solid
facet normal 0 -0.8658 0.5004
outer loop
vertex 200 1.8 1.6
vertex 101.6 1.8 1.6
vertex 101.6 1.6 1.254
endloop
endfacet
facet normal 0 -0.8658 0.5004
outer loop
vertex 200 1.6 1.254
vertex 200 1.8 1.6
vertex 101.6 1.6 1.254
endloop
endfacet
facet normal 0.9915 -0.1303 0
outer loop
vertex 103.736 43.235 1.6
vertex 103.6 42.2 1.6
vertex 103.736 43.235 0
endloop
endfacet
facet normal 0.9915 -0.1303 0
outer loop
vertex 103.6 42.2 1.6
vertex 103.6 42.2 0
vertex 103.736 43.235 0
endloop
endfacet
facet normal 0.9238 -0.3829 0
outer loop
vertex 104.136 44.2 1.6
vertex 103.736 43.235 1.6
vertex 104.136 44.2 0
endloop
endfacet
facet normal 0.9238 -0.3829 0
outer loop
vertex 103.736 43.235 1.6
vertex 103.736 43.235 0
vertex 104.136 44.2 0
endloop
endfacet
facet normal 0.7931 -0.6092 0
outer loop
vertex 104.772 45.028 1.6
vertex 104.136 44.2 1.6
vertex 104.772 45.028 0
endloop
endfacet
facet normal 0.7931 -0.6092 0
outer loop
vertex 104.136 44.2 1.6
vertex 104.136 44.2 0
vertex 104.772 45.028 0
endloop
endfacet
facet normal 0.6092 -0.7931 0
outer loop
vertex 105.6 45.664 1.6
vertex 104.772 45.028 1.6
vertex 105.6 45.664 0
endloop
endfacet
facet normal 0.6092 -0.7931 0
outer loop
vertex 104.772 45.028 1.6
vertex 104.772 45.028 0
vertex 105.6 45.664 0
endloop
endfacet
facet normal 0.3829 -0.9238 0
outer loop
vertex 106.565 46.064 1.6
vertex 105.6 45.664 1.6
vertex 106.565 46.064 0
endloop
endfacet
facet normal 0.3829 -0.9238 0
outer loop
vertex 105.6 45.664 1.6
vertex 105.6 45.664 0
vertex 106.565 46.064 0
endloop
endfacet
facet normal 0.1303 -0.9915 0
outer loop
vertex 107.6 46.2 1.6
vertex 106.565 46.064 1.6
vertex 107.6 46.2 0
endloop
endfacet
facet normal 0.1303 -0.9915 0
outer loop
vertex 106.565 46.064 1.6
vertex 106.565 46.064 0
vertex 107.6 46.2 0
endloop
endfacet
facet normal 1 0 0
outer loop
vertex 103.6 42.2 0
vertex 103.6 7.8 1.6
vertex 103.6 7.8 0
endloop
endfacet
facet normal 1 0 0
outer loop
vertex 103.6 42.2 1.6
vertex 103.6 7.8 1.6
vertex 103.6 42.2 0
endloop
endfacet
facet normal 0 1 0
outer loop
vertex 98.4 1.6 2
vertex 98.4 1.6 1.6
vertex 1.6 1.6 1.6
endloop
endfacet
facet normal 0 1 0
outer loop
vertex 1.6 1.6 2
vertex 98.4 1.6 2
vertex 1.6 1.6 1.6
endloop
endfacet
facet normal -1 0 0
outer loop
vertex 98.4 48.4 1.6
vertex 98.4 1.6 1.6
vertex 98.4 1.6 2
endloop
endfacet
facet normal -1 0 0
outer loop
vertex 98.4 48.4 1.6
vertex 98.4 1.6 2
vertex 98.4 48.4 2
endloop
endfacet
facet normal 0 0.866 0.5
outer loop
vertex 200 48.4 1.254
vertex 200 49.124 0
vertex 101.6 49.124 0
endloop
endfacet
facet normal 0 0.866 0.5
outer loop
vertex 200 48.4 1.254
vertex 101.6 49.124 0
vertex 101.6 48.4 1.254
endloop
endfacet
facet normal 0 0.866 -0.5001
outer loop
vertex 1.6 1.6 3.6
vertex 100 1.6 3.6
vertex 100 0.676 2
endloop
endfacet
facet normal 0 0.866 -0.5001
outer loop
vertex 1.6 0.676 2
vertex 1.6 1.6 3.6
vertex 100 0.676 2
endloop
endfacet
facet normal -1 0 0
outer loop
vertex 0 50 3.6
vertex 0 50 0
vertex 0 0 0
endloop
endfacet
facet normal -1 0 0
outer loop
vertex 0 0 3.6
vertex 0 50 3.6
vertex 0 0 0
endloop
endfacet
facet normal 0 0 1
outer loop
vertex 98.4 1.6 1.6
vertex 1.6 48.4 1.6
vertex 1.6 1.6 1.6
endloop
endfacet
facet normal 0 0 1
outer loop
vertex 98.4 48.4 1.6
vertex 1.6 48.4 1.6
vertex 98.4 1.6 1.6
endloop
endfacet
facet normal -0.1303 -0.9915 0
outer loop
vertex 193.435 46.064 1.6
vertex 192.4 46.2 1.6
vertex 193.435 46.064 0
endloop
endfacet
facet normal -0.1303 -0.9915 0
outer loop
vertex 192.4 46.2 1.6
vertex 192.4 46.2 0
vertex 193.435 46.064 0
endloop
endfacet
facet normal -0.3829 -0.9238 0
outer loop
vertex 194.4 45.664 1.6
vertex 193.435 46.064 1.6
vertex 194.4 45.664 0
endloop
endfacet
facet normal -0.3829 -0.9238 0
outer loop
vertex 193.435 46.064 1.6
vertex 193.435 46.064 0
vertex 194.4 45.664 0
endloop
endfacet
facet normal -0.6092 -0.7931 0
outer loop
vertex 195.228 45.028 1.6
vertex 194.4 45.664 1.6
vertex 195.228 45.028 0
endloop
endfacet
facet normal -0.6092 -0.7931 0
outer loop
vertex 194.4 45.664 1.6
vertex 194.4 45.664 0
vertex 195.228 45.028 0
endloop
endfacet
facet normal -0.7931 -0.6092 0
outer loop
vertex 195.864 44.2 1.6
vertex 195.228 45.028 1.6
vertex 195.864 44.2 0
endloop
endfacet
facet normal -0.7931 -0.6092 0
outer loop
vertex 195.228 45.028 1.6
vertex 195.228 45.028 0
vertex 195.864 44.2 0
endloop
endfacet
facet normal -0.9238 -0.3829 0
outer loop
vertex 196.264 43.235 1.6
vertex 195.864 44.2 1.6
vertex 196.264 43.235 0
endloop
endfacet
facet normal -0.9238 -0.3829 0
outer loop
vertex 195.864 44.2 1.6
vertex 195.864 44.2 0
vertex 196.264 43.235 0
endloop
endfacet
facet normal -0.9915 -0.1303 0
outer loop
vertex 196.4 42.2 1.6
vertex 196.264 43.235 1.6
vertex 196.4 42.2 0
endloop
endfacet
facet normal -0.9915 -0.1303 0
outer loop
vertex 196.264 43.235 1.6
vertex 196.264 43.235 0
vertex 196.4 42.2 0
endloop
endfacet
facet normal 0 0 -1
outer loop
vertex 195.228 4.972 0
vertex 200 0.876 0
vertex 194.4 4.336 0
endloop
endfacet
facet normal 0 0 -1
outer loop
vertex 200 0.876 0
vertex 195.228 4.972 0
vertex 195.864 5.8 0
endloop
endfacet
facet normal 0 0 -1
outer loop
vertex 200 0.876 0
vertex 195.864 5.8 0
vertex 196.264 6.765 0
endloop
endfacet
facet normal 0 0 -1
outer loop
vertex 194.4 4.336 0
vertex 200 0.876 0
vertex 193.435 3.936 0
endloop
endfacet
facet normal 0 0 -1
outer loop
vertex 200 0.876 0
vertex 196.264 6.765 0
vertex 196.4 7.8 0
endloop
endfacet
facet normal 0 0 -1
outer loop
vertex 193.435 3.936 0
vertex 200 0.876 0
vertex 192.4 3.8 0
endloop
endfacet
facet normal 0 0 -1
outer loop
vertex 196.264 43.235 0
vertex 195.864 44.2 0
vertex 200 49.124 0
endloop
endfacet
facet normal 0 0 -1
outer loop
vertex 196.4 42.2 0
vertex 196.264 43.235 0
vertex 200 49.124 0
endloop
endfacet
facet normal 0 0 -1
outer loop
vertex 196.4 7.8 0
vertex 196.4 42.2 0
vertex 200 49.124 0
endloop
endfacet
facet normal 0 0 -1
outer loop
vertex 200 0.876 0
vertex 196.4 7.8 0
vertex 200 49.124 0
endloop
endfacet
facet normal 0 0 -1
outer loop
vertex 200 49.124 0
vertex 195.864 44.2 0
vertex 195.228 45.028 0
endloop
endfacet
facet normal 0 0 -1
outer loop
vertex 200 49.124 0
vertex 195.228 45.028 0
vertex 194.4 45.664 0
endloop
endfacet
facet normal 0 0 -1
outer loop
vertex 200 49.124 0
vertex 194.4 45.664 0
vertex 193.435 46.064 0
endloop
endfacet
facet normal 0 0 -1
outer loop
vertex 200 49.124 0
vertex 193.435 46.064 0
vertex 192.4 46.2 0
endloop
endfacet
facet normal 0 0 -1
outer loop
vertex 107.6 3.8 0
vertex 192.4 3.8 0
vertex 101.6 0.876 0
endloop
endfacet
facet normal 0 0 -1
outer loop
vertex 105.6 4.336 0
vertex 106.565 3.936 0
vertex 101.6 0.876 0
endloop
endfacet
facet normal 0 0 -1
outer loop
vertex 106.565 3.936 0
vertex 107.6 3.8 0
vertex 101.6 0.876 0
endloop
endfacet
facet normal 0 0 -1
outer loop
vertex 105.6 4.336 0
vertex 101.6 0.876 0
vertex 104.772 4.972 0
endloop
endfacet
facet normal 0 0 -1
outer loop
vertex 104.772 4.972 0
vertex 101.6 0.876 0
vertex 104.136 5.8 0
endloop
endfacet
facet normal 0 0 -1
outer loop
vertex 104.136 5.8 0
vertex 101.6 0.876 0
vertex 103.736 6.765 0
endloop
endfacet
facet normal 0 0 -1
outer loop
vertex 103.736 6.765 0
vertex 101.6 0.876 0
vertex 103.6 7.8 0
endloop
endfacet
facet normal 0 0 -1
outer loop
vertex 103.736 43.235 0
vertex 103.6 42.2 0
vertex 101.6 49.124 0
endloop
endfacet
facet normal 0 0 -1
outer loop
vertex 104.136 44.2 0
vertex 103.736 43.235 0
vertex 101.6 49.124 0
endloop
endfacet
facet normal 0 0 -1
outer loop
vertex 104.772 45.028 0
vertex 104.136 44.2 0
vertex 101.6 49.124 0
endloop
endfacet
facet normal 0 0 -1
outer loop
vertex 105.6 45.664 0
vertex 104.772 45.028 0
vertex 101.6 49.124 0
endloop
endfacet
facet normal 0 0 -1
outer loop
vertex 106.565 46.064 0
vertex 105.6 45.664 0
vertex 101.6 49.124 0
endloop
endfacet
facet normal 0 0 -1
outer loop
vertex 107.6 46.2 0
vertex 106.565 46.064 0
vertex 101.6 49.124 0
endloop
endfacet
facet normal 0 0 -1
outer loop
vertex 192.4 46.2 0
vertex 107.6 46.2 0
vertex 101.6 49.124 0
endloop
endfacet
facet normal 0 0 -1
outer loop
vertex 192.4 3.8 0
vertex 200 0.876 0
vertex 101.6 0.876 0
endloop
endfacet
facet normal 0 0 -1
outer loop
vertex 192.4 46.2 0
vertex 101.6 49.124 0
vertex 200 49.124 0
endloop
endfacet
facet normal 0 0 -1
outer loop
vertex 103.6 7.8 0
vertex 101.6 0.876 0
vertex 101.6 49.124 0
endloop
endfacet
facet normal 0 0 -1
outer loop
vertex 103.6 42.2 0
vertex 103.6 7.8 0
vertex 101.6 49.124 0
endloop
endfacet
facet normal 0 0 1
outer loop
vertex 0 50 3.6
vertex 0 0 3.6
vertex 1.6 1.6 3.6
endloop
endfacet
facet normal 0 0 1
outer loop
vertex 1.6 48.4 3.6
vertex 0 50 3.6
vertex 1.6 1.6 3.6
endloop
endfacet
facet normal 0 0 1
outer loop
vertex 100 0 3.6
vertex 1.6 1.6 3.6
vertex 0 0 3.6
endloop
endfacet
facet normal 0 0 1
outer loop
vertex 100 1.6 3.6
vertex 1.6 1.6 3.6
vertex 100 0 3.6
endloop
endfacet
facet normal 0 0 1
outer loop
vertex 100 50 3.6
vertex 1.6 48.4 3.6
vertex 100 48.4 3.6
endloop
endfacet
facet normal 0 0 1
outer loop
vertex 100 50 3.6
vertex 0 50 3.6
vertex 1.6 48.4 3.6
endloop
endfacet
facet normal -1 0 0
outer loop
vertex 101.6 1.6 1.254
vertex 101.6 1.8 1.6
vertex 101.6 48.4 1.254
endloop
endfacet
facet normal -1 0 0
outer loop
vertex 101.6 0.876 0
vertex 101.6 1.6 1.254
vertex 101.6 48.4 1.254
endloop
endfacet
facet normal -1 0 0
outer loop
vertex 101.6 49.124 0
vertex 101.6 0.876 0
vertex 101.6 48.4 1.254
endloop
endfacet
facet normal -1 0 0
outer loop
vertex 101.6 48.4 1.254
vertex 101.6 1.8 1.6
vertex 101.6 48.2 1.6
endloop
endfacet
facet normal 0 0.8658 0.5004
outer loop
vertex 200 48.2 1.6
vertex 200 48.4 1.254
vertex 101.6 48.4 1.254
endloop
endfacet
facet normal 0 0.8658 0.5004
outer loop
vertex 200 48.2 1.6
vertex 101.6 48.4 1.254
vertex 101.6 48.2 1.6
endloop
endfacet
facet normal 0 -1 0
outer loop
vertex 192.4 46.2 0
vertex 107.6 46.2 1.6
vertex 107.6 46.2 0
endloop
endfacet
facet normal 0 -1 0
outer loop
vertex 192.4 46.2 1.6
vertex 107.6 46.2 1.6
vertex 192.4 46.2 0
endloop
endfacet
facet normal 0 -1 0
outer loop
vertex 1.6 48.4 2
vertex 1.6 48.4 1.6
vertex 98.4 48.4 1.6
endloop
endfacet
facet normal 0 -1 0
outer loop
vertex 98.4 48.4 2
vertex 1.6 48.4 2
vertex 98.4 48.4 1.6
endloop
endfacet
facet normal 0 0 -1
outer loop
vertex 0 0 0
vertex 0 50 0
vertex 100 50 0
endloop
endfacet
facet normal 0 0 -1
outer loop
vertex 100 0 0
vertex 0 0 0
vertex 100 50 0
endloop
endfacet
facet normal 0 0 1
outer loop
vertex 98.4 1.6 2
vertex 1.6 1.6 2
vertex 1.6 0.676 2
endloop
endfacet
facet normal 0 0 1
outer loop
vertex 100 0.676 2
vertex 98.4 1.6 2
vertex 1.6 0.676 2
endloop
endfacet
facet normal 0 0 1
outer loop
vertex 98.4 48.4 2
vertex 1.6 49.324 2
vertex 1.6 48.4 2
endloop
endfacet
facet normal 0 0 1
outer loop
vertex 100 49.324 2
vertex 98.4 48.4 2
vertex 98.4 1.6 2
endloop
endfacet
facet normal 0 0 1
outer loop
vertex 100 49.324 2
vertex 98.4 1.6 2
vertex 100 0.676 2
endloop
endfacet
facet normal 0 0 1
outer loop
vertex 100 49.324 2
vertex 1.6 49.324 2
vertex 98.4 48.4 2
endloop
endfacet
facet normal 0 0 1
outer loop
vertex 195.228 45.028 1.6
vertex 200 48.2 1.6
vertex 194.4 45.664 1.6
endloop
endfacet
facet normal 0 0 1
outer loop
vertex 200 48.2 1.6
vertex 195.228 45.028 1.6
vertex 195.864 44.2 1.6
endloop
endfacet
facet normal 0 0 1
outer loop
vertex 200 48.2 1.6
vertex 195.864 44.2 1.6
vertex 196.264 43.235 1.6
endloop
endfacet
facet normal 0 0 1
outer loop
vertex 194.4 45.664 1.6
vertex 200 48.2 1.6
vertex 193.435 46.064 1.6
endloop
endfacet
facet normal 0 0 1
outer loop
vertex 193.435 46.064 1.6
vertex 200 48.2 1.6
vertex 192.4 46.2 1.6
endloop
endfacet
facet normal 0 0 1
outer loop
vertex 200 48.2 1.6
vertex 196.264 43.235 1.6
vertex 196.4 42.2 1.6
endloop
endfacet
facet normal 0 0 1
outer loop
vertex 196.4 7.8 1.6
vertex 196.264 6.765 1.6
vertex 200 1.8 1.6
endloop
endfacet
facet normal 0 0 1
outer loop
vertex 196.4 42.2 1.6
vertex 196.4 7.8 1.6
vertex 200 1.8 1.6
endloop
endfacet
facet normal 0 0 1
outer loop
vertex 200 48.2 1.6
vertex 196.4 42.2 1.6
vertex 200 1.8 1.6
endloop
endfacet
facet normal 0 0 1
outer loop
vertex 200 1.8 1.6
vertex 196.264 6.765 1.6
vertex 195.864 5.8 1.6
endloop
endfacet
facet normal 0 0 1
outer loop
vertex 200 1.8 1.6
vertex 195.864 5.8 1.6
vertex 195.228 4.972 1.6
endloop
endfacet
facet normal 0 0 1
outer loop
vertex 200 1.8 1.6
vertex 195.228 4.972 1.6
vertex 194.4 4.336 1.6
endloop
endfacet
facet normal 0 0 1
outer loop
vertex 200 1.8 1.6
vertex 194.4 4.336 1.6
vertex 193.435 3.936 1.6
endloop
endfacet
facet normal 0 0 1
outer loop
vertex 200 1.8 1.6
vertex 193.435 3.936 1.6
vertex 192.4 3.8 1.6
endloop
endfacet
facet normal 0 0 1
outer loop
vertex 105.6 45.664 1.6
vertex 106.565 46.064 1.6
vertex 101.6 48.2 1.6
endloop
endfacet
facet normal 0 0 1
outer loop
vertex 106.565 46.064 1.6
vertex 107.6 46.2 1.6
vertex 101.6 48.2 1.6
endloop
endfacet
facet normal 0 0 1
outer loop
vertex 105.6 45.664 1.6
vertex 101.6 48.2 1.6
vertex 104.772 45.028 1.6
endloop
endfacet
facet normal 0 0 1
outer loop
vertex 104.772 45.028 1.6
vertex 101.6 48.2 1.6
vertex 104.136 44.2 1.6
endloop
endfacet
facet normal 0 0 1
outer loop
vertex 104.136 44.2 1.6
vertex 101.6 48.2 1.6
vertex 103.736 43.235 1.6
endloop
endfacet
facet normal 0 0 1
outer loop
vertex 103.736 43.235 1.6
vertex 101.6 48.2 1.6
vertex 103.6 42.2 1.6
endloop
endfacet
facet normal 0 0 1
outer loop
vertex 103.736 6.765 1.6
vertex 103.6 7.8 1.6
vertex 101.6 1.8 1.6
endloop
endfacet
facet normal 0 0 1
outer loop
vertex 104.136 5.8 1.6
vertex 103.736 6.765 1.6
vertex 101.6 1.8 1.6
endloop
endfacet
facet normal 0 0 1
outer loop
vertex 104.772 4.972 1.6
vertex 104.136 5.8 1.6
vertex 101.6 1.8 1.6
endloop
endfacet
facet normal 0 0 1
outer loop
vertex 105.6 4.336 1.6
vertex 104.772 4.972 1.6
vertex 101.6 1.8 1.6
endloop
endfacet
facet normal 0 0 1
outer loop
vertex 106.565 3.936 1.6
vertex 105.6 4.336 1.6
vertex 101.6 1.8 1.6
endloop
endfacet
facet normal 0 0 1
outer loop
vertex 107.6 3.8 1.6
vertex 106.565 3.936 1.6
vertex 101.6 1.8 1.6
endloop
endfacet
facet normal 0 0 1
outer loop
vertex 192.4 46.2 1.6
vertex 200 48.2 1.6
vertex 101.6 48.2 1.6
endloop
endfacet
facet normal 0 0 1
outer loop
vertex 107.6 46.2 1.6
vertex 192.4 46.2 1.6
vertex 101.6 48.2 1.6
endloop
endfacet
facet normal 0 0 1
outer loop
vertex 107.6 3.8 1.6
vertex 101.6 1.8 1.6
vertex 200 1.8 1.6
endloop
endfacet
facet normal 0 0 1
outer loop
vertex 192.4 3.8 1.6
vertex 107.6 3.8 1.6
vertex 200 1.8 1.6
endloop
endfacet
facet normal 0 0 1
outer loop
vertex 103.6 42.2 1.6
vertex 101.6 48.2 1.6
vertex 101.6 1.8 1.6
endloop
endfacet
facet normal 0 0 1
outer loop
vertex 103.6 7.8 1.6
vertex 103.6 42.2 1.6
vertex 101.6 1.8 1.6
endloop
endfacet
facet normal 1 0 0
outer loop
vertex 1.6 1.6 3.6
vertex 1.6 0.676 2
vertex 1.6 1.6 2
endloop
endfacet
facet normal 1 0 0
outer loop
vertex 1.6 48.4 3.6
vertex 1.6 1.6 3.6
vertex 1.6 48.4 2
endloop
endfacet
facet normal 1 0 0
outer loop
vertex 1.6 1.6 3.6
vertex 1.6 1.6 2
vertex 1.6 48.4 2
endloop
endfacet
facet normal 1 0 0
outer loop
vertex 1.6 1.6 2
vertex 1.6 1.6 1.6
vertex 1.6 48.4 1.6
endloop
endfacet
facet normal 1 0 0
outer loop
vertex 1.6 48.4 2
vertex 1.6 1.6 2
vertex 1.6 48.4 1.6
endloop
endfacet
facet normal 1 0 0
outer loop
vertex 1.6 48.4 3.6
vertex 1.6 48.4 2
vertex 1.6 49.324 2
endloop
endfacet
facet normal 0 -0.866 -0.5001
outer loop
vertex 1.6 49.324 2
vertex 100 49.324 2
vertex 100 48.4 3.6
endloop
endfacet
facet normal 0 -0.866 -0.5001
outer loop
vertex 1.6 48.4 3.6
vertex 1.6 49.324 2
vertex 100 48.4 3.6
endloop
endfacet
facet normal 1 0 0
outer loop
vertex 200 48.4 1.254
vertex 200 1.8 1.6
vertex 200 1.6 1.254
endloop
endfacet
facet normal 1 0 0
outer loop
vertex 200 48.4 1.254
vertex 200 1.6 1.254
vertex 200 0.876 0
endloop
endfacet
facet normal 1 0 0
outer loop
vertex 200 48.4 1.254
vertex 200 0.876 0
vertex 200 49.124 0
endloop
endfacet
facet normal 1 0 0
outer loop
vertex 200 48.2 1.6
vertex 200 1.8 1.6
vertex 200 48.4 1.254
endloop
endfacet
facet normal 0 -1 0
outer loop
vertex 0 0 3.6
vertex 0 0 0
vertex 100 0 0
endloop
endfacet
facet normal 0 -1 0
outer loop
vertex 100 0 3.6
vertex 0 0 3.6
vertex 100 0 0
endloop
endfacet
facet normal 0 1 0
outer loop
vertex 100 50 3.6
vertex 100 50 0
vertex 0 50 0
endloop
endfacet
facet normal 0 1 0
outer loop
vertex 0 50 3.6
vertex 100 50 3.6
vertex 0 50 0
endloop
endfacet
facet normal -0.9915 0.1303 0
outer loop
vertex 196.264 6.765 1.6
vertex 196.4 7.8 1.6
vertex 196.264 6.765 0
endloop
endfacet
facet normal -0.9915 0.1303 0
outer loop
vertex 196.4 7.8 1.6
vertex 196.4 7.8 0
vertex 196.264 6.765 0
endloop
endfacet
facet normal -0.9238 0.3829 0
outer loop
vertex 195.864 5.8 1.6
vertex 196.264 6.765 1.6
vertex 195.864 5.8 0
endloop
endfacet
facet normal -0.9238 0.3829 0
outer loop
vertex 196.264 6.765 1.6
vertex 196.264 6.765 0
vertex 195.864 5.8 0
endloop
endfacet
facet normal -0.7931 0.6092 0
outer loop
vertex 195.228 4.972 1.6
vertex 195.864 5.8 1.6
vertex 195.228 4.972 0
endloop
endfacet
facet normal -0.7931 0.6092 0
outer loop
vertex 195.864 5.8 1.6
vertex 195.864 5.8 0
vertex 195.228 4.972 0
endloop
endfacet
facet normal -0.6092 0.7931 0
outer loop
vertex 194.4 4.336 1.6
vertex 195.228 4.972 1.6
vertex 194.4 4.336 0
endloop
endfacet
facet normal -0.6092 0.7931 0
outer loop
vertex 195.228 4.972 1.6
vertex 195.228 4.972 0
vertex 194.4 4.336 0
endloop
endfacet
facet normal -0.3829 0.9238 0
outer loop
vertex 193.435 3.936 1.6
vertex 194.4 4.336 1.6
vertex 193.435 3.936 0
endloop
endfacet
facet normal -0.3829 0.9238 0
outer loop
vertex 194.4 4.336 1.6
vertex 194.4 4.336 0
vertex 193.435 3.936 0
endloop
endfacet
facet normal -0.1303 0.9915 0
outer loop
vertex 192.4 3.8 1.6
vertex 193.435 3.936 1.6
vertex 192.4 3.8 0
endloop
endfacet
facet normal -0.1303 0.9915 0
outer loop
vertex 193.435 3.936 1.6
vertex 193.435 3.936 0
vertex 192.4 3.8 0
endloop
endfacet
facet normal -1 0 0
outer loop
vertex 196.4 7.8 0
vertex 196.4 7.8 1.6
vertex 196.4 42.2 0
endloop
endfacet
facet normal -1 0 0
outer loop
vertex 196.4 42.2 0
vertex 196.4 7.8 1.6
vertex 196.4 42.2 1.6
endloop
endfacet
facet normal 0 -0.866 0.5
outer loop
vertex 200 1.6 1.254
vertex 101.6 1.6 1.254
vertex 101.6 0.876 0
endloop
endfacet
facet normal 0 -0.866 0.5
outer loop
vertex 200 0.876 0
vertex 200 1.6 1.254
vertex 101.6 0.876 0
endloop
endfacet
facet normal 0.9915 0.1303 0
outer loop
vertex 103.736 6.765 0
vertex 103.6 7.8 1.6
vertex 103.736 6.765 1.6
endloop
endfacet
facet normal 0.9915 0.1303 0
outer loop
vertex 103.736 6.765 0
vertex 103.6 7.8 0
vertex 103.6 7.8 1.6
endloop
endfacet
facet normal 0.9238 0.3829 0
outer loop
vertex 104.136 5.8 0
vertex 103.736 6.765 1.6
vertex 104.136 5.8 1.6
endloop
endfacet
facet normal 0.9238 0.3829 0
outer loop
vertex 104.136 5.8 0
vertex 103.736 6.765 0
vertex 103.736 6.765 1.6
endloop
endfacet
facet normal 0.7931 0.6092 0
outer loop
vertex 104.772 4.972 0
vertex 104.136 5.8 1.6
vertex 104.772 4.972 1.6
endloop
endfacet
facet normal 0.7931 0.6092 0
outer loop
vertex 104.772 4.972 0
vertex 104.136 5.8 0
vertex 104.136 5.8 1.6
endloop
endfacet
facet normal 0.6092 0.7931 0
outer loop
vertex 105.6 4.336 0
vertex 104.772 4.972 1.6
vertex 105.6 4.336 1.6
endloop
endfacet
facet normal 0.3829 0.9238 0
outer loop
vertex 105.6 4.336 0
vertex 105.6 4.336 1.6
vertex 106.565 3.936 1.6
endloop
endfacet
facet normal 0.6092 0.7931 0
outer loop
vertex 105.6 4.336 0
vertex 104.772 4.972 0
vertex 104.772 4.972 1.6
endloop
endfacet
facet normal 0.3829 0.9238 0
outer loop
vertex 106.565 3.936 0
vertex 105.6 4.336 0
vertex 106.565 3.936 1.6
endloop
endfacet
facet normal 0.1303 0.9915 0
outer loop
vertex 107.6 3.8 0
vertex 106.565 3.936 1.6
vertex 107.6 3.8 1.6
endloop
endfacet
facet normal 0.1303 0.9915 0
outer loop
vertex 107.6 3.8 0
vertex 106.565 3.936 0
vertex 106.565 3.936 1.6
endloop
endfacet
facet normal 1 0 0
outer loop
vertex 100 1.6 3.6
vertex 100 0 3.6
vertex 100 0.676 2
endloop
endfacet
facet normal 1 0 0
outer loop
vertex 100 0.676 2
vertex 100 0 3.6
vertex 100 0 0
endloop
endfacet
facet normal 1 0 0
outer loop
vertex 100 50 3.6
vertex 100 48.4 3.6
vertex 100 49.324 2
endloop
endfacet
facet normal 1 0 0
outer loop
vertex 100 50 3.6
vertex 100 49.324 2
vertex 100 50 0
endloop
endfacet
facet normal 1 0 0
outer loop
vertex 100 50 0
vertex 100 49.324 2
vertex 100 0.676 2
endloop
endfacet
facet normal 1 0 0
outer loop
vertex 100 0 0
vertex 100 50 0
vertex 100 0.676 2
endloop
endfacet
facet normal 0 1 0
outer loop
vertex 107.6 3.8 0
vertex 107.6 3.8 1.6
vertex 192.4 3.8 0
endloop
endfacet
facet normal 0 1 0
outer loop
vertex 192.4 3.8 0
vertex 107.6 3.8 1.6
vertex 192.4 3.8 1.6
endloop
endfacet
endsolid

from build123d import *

# Parameters (mm, degrees)
F4_DEPTH  = 3.6
F3_W      = 47.6
F3_H      = 46.8
F3_W_2    = 1.6
F5_DEPTH  = 1.6
F6_DEPTH  = 2
F8_DEPTH  = 98.4
F9_START  = 1.6
F9_DEPTH  = 98.4
F11_W     = 92.8
F11_H     = 42.4
F13_DEPTH = 1.601
F14_R     = 4


with BuildPart() as f4:
    # F3 (on Top) → F4 (new body)
    with BuildSketch(Plane.XY):
        Polygon((0, 50), (0, 0), (100, 0), (100, 1.6), (98.4, 1.6), (50.8, 1.6), (49.2, 1.6), (1.6, 1.6), (1.6, 48.4), (49.2, 48.4), (50.8, 48.4), (98.4, 48.4), (100, 48.4), (100, 50), align=None)
    extrude(amount=F4_DEPTH)

    # F3 (on Top) → F5 (join)
    with BuildSketch(Plane.XY):
        with Locations((25.4, 25)):
            Rectangle(F3_W, F3_H)
        with Locations((50, 25)):
            Rectangle(F3_W_2, F3_H)
        with Locations((74.6, 25)):
            Rectangle(F3_W, F3_H)
    extrude(amount=F5_DEPTH)

    # F3 (on Top) → F6 (join)
    with BuildSketch(Plane.XY):
        with Locations((99.2, 25)):
            Rectangle(F3_W_2, F3_H)
    extrude(amount=F6_DEPTH)

    # F7 (on face) → F8 (cut)
    with BuildSketch(Plane.YZ.offset(100)):
        Polygon((0.6762395693, 2), (0.8762395693, 2), (1.6, 3.2535898385), (1.6, 3.6), align=None)
        Polygon((48.4, 3.2535898385), (49.1237604307, 2), (49.3237604307, 2), (48.4, 3.6), align=None)
        Polygon((0.8762395693, 2), (1.6, 2), (1.6, 3.2535898385), align=None)
        Polygon((48.4, 3.2535898385), (48.4, 2), (49.1237604307, 2), align=None)
    extrude(amount=-F8_DEPTH, mode=Mode.SUBTRACT)


with BuildPart() as f9:
    # F7 (on face) → F9 (new body)
    with BuildSketch(Plane.YZ.offset(100).offset(F9_START)):
        Polygon((1.6, 3.2535898385), (1.6, 2), (48.4, 2), (48.4, 3.2535898385), (48.2, 3.6), (1.8, 3.6), align=None)
        Polygon((0.8762395693, 2), (1.6, 2), (1.6, 3.2535898385), align=None)
        Polygon((48.4, 3.2535898385), (48.4, 2), (49.1237604307, 2), align=None)
    extrude(amount=F9_DEPTH)


with BuildPart() as f9_1:
    # F10: moved
    add(f9.part.moved(Location((0, 0, -2))))

    # F11 (on face) → F13 (cut, through all)
    with BuildSketch(Plane.XY.offset(1.6)):
        with Locations((150, 25)):
            Rectangle(F11_W, F11_H)
    extrude(amount=-F13_DEPTH, mode=Mode.SUBTRACT)

    # F14
    f14_edges = [f9_1.edges().sort_by_distance(p)[0] for p in [
        (103.6, 46.2, 0.8),
        (103.6, 3.8, 0.8),
        (196.4, 3.8, 0.8),
        (196.4, 46.2, 0.8),
    ]]
    fillet(f14_edges, radius=F14_R)


solid = Compound([f4.part, f9_1.part])
